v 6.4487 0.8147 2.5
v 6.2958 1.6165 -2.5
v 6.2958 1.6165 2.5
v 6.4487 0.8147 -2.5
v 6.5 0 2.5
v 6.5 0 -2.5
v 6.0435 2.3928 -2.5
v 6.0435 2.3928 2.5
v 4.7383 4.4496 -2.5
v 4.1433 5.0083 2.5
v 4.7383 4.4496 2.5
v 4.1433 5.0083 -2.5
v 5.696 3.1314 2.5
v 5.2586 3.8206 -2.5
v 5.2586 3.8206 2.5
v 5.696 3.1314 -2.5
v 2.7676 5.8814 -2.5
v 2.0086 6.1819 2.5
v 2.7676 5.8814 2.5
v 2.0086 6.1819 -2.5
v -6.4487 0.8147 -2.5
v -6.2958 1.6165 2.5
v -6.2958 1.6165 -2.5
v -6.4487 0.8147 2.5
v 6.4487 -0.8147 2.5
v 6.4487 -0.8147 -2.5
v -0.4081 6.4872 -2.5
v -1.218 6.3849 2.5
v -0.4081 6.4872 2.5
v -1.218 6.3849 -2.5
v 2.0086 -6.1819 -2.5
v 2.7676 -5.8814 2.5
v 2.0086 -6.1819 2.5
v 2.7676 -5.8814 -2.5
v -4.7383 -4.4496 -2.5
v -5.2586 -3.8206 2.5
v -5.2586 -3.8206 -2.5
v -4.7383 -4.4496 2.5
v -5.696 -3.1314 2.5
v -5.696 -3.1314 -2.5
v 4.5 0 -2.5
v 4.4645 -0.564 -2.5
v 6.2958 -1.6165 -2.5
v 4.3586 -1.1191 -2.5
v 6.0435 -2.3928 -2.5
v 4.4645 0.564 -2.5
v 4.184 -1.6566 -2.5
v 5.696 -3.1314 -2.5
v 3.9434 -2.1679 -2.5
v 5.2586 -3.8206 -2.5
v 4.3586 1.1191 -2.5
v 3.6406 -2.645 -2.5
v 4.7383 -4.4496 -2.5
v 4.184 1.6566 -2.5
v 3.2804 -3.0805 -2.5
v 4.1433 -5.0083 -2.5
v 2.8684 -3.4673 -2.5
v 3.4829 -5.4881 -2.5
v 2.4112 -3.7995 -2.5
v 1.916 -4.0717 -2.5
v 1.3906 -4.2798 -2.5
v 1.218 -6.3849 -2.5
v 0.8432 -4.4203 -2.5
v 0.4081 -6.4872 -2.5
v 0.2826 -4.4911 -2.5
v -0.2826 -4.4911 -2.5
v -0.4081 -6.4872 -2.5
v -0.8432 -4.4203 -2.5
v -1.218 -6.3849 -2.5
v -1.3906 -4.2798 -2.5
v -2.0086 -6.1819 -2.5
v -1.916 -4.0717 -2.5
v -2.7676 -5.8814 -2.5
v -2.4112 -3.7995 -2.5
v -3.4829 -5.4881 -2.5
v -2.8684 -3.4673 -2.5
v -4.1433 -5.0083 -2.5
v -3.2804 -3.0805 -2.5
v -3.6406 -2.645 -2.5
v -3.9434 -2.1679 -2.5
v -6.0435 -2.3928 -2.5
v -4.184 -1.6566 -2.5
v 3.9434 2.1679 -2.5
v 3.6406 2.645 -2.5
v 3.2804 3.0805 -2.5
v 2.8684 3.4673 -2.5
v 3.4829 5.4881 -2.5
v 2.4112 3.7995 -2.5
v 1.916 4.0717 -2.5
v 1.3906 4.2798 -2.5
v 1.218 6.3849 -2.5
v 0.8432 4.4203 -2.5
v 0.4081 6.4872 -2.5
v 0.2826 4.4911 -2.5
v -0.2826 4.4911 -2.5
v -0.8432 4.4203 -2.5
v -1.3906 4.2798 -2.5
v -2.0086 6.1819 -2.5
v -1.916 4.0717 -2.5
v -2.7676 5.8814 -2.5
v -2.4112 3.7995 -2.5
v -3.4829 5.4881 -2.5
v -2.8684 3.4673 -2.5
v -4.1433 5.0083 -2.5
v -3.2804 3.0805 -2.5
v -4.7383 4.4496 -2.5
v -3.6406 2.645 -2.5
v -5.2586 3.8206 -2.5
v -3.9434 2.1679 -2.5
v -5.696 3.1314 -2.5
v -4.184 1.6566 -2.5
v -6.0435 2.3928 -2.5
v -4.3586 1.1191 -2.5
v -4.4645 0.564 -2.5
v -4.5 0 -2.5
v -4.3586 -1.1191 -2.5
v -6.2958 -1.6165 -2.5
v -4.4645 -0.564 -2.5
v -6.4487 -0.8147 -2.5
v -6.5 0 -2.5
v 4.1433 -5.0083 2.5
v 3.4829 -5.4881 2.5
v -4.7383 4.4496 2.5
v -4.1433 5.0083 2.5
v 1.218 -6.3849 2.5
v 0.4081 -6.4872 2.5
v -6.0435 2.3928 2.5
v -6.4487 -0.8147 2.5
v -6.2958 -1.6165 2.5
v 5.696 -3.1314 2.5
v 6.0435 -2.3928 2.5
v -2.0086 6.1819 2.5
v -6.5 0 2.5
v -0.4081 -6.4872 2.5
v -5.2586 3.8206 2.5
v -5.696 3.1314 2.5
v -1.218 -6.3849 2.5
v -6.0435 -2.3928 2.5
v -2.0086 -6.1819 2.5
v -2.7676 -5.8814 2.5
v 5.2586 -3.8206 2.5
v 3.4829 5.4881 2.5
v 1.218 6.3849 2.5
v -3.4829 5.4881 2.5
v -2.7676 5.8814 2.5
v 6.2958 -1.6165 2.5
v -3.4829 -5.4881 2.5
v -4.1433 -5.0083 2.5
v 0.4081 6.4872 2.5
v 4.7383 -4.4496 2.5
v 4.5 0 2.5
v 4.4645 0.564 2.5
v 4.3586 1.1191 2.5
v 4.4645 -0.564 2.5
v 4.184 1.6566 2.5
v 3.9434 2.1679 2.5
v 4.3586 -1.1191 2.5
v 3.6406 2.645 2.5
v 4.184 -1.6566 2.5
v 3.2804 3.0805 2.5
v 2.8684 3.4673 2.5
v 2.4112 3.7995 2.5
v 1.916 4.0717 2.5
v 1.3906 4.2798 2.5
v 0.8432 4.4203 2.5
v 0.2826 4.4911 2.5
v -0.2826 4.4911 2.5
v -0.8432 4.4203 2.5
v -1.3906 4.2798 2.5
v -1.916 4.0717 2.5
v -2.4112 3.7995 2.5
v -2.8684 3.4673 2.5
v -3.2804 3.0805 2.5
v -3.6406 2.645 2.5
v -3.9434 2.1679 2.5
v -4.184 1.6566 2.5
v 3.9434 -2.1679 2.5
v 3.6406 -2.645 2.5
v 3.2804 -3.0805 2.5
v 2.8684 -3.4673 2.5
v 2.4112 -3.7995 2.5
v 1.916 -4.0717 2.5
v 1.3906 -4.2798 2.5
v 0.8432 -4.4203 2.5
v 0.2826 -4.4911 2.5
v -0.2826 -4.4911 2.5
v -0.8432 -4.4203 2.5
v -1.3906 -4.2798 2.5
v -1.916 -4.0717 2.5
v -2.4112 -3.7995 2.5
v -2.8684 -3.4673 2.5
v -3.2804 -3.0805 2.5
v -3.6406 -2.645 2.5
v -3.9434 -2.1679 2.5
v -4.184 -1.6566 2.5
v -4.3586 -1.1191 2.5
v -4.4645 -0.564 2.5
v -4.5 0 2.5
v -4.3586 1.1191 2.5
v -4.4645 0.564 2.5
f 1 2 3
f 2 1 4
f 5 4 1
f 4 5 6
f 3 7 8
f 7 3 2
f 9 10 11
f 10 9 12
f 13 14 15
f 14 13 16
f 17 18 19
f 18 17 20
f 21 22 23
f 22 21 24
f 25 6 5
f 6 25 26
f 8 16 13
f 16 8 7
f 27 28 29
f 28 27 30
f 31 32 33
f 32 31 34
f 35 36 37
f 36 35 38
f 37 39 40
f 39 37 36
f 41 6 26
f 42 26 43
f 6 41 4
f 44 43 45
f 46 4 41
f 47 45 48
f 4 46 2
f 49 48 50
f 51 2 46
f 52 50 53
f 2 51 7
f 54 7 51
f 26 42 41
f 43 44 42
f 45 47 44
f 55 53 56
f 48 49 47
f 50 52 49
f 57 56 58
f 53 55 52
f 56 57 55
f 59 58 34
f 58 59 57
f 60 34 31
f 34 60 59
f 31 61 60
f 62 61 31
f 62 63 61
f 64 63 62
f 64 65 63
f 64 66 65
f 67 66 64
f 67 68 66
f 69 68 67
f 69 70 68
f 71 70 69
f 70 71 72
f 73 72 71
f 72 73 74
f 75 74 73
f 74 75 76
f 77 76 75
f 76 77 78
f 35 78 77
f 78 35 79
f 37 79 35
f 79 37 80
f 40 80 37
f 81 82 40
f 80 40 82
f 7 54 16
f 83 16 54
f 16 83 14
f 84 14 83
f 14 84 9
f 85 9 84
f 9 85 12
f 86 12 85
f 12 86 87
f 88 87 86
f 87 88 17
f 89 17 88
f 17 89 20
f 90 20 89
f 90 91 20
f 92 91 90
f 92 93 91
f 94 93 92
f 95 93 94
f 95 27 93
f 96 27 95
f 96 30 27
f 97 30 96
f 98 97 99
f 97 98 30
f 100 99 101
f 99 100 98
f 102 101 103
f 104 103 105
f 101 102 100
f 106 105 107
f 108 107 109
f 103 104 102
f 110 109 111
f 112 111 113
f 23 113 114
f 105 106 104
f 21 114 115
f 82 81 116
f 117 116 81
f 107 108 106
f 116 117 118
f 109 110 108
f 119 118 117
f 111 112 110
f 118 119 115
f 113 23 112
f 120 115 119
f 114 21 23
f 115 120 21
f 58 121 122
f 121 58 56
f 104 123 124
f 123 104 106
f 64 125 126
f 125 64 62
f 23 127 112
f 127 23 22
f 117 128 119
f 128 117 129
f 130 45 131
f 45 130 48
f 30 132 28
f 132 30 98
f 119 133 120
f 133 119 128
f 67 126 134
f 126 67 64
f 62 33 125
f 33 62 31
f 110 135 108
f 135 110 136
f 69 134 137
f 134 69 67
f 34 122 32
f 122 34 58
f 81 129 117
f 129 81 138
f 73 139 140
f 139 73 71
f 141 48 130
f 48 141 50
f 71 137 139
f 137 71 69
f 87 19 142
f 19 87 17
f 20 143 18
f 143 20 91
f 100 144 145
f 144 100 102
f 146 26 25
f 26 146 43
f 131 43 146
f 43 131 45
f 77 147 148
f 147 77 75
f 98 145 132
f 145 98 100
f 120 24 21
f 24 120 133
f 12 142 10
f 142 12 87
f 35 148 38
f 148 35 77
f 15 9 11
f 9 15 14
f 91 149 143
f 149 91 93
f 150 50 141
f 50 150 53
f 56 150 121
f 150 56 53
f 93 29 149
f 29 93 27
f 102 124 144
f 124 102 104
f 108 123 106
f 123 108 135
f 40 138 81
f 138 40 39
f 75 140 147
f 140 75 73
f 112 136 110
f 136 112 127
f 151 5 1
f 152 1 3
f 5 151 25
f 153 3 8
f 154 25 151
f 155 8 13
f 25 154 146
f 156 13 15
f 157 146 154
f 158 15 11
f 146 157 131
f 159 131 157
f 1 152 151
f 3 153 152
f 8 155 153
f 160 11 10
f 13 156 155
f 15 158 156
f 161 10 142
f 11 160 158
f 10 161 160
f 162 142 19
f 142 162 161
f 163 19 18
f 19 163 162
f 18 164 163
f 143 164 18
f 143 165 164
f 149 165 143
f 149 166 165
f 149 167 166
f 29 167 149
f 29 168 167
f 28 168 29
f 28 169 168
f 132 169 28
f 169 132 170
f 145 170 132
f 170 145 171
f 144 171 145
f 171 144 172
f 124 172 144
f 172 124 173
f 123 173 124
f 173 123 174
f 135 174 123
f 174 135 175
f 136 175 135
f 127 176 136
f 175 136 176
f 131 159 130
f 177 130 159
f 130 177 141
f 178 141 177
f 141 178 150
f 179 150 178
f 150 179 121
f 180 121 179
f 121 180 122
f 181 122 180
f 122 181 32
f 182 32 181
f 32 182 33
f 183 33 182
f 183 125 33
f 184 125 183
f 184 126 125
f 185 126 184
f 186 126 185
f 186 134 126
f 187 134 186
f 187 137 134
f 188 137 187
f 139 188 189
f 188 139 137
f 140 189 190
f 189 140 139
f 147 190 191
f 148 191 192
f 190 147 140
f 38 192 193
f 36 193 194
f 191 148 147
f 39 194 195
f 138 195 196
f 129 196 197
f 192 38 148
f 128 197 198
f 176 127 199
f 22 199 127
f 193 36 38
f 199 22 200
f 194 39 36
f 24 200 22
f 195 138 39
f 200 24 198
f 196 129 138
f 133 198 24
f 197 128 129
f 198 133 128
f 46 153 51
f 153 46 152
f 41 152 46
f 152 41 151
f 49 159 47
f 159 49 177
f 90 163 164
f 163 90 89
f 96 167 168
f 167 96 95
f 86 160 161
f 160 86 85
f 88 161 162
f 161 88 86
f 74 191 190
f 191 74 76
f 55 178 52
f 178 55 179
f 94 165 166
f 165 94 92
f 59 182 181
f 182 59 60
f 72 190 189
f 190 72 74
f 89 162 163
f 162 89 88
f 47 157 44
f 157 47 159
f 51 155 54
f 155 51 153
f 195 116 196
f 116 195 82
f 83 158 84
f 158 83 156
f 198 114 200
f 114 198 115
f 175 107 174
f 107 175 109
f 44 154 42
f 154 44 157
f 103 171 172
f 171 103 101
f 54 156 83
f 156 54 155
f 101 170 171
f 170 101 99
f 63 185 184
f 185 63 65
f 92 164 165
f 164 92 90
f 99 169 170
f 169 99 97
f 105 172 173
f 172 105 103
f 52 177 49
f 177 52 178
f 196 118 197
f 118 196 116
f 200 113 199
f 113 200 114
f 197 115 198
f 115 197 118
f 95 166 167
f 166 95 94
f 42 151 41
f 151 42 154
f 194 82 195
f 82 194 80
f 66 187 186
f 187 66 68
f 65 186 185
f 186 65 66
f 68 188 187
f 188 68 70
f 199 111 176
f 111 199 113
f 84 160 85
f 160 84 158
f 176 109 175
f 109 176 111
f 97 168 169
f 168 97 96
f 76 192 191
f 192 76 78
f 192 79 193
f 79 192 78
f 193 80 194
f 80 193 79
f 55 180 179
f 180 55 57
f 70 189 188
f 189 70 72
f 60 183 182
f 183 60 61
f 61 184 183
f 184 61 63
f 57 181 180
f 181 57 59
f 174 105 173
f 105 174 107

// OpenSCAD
$fn = 50;


difference() {
	union() {
		translate(v = [0, 0, -2.5000000000]) {
			cylinder(h = 5, r = 6.5000000000);
		}
	}
	union() {
		translate(v = [0, 0, -100.0000000000]) {
			cylinder(h = 200, r = 4.5000000000);
		}
	}
}
